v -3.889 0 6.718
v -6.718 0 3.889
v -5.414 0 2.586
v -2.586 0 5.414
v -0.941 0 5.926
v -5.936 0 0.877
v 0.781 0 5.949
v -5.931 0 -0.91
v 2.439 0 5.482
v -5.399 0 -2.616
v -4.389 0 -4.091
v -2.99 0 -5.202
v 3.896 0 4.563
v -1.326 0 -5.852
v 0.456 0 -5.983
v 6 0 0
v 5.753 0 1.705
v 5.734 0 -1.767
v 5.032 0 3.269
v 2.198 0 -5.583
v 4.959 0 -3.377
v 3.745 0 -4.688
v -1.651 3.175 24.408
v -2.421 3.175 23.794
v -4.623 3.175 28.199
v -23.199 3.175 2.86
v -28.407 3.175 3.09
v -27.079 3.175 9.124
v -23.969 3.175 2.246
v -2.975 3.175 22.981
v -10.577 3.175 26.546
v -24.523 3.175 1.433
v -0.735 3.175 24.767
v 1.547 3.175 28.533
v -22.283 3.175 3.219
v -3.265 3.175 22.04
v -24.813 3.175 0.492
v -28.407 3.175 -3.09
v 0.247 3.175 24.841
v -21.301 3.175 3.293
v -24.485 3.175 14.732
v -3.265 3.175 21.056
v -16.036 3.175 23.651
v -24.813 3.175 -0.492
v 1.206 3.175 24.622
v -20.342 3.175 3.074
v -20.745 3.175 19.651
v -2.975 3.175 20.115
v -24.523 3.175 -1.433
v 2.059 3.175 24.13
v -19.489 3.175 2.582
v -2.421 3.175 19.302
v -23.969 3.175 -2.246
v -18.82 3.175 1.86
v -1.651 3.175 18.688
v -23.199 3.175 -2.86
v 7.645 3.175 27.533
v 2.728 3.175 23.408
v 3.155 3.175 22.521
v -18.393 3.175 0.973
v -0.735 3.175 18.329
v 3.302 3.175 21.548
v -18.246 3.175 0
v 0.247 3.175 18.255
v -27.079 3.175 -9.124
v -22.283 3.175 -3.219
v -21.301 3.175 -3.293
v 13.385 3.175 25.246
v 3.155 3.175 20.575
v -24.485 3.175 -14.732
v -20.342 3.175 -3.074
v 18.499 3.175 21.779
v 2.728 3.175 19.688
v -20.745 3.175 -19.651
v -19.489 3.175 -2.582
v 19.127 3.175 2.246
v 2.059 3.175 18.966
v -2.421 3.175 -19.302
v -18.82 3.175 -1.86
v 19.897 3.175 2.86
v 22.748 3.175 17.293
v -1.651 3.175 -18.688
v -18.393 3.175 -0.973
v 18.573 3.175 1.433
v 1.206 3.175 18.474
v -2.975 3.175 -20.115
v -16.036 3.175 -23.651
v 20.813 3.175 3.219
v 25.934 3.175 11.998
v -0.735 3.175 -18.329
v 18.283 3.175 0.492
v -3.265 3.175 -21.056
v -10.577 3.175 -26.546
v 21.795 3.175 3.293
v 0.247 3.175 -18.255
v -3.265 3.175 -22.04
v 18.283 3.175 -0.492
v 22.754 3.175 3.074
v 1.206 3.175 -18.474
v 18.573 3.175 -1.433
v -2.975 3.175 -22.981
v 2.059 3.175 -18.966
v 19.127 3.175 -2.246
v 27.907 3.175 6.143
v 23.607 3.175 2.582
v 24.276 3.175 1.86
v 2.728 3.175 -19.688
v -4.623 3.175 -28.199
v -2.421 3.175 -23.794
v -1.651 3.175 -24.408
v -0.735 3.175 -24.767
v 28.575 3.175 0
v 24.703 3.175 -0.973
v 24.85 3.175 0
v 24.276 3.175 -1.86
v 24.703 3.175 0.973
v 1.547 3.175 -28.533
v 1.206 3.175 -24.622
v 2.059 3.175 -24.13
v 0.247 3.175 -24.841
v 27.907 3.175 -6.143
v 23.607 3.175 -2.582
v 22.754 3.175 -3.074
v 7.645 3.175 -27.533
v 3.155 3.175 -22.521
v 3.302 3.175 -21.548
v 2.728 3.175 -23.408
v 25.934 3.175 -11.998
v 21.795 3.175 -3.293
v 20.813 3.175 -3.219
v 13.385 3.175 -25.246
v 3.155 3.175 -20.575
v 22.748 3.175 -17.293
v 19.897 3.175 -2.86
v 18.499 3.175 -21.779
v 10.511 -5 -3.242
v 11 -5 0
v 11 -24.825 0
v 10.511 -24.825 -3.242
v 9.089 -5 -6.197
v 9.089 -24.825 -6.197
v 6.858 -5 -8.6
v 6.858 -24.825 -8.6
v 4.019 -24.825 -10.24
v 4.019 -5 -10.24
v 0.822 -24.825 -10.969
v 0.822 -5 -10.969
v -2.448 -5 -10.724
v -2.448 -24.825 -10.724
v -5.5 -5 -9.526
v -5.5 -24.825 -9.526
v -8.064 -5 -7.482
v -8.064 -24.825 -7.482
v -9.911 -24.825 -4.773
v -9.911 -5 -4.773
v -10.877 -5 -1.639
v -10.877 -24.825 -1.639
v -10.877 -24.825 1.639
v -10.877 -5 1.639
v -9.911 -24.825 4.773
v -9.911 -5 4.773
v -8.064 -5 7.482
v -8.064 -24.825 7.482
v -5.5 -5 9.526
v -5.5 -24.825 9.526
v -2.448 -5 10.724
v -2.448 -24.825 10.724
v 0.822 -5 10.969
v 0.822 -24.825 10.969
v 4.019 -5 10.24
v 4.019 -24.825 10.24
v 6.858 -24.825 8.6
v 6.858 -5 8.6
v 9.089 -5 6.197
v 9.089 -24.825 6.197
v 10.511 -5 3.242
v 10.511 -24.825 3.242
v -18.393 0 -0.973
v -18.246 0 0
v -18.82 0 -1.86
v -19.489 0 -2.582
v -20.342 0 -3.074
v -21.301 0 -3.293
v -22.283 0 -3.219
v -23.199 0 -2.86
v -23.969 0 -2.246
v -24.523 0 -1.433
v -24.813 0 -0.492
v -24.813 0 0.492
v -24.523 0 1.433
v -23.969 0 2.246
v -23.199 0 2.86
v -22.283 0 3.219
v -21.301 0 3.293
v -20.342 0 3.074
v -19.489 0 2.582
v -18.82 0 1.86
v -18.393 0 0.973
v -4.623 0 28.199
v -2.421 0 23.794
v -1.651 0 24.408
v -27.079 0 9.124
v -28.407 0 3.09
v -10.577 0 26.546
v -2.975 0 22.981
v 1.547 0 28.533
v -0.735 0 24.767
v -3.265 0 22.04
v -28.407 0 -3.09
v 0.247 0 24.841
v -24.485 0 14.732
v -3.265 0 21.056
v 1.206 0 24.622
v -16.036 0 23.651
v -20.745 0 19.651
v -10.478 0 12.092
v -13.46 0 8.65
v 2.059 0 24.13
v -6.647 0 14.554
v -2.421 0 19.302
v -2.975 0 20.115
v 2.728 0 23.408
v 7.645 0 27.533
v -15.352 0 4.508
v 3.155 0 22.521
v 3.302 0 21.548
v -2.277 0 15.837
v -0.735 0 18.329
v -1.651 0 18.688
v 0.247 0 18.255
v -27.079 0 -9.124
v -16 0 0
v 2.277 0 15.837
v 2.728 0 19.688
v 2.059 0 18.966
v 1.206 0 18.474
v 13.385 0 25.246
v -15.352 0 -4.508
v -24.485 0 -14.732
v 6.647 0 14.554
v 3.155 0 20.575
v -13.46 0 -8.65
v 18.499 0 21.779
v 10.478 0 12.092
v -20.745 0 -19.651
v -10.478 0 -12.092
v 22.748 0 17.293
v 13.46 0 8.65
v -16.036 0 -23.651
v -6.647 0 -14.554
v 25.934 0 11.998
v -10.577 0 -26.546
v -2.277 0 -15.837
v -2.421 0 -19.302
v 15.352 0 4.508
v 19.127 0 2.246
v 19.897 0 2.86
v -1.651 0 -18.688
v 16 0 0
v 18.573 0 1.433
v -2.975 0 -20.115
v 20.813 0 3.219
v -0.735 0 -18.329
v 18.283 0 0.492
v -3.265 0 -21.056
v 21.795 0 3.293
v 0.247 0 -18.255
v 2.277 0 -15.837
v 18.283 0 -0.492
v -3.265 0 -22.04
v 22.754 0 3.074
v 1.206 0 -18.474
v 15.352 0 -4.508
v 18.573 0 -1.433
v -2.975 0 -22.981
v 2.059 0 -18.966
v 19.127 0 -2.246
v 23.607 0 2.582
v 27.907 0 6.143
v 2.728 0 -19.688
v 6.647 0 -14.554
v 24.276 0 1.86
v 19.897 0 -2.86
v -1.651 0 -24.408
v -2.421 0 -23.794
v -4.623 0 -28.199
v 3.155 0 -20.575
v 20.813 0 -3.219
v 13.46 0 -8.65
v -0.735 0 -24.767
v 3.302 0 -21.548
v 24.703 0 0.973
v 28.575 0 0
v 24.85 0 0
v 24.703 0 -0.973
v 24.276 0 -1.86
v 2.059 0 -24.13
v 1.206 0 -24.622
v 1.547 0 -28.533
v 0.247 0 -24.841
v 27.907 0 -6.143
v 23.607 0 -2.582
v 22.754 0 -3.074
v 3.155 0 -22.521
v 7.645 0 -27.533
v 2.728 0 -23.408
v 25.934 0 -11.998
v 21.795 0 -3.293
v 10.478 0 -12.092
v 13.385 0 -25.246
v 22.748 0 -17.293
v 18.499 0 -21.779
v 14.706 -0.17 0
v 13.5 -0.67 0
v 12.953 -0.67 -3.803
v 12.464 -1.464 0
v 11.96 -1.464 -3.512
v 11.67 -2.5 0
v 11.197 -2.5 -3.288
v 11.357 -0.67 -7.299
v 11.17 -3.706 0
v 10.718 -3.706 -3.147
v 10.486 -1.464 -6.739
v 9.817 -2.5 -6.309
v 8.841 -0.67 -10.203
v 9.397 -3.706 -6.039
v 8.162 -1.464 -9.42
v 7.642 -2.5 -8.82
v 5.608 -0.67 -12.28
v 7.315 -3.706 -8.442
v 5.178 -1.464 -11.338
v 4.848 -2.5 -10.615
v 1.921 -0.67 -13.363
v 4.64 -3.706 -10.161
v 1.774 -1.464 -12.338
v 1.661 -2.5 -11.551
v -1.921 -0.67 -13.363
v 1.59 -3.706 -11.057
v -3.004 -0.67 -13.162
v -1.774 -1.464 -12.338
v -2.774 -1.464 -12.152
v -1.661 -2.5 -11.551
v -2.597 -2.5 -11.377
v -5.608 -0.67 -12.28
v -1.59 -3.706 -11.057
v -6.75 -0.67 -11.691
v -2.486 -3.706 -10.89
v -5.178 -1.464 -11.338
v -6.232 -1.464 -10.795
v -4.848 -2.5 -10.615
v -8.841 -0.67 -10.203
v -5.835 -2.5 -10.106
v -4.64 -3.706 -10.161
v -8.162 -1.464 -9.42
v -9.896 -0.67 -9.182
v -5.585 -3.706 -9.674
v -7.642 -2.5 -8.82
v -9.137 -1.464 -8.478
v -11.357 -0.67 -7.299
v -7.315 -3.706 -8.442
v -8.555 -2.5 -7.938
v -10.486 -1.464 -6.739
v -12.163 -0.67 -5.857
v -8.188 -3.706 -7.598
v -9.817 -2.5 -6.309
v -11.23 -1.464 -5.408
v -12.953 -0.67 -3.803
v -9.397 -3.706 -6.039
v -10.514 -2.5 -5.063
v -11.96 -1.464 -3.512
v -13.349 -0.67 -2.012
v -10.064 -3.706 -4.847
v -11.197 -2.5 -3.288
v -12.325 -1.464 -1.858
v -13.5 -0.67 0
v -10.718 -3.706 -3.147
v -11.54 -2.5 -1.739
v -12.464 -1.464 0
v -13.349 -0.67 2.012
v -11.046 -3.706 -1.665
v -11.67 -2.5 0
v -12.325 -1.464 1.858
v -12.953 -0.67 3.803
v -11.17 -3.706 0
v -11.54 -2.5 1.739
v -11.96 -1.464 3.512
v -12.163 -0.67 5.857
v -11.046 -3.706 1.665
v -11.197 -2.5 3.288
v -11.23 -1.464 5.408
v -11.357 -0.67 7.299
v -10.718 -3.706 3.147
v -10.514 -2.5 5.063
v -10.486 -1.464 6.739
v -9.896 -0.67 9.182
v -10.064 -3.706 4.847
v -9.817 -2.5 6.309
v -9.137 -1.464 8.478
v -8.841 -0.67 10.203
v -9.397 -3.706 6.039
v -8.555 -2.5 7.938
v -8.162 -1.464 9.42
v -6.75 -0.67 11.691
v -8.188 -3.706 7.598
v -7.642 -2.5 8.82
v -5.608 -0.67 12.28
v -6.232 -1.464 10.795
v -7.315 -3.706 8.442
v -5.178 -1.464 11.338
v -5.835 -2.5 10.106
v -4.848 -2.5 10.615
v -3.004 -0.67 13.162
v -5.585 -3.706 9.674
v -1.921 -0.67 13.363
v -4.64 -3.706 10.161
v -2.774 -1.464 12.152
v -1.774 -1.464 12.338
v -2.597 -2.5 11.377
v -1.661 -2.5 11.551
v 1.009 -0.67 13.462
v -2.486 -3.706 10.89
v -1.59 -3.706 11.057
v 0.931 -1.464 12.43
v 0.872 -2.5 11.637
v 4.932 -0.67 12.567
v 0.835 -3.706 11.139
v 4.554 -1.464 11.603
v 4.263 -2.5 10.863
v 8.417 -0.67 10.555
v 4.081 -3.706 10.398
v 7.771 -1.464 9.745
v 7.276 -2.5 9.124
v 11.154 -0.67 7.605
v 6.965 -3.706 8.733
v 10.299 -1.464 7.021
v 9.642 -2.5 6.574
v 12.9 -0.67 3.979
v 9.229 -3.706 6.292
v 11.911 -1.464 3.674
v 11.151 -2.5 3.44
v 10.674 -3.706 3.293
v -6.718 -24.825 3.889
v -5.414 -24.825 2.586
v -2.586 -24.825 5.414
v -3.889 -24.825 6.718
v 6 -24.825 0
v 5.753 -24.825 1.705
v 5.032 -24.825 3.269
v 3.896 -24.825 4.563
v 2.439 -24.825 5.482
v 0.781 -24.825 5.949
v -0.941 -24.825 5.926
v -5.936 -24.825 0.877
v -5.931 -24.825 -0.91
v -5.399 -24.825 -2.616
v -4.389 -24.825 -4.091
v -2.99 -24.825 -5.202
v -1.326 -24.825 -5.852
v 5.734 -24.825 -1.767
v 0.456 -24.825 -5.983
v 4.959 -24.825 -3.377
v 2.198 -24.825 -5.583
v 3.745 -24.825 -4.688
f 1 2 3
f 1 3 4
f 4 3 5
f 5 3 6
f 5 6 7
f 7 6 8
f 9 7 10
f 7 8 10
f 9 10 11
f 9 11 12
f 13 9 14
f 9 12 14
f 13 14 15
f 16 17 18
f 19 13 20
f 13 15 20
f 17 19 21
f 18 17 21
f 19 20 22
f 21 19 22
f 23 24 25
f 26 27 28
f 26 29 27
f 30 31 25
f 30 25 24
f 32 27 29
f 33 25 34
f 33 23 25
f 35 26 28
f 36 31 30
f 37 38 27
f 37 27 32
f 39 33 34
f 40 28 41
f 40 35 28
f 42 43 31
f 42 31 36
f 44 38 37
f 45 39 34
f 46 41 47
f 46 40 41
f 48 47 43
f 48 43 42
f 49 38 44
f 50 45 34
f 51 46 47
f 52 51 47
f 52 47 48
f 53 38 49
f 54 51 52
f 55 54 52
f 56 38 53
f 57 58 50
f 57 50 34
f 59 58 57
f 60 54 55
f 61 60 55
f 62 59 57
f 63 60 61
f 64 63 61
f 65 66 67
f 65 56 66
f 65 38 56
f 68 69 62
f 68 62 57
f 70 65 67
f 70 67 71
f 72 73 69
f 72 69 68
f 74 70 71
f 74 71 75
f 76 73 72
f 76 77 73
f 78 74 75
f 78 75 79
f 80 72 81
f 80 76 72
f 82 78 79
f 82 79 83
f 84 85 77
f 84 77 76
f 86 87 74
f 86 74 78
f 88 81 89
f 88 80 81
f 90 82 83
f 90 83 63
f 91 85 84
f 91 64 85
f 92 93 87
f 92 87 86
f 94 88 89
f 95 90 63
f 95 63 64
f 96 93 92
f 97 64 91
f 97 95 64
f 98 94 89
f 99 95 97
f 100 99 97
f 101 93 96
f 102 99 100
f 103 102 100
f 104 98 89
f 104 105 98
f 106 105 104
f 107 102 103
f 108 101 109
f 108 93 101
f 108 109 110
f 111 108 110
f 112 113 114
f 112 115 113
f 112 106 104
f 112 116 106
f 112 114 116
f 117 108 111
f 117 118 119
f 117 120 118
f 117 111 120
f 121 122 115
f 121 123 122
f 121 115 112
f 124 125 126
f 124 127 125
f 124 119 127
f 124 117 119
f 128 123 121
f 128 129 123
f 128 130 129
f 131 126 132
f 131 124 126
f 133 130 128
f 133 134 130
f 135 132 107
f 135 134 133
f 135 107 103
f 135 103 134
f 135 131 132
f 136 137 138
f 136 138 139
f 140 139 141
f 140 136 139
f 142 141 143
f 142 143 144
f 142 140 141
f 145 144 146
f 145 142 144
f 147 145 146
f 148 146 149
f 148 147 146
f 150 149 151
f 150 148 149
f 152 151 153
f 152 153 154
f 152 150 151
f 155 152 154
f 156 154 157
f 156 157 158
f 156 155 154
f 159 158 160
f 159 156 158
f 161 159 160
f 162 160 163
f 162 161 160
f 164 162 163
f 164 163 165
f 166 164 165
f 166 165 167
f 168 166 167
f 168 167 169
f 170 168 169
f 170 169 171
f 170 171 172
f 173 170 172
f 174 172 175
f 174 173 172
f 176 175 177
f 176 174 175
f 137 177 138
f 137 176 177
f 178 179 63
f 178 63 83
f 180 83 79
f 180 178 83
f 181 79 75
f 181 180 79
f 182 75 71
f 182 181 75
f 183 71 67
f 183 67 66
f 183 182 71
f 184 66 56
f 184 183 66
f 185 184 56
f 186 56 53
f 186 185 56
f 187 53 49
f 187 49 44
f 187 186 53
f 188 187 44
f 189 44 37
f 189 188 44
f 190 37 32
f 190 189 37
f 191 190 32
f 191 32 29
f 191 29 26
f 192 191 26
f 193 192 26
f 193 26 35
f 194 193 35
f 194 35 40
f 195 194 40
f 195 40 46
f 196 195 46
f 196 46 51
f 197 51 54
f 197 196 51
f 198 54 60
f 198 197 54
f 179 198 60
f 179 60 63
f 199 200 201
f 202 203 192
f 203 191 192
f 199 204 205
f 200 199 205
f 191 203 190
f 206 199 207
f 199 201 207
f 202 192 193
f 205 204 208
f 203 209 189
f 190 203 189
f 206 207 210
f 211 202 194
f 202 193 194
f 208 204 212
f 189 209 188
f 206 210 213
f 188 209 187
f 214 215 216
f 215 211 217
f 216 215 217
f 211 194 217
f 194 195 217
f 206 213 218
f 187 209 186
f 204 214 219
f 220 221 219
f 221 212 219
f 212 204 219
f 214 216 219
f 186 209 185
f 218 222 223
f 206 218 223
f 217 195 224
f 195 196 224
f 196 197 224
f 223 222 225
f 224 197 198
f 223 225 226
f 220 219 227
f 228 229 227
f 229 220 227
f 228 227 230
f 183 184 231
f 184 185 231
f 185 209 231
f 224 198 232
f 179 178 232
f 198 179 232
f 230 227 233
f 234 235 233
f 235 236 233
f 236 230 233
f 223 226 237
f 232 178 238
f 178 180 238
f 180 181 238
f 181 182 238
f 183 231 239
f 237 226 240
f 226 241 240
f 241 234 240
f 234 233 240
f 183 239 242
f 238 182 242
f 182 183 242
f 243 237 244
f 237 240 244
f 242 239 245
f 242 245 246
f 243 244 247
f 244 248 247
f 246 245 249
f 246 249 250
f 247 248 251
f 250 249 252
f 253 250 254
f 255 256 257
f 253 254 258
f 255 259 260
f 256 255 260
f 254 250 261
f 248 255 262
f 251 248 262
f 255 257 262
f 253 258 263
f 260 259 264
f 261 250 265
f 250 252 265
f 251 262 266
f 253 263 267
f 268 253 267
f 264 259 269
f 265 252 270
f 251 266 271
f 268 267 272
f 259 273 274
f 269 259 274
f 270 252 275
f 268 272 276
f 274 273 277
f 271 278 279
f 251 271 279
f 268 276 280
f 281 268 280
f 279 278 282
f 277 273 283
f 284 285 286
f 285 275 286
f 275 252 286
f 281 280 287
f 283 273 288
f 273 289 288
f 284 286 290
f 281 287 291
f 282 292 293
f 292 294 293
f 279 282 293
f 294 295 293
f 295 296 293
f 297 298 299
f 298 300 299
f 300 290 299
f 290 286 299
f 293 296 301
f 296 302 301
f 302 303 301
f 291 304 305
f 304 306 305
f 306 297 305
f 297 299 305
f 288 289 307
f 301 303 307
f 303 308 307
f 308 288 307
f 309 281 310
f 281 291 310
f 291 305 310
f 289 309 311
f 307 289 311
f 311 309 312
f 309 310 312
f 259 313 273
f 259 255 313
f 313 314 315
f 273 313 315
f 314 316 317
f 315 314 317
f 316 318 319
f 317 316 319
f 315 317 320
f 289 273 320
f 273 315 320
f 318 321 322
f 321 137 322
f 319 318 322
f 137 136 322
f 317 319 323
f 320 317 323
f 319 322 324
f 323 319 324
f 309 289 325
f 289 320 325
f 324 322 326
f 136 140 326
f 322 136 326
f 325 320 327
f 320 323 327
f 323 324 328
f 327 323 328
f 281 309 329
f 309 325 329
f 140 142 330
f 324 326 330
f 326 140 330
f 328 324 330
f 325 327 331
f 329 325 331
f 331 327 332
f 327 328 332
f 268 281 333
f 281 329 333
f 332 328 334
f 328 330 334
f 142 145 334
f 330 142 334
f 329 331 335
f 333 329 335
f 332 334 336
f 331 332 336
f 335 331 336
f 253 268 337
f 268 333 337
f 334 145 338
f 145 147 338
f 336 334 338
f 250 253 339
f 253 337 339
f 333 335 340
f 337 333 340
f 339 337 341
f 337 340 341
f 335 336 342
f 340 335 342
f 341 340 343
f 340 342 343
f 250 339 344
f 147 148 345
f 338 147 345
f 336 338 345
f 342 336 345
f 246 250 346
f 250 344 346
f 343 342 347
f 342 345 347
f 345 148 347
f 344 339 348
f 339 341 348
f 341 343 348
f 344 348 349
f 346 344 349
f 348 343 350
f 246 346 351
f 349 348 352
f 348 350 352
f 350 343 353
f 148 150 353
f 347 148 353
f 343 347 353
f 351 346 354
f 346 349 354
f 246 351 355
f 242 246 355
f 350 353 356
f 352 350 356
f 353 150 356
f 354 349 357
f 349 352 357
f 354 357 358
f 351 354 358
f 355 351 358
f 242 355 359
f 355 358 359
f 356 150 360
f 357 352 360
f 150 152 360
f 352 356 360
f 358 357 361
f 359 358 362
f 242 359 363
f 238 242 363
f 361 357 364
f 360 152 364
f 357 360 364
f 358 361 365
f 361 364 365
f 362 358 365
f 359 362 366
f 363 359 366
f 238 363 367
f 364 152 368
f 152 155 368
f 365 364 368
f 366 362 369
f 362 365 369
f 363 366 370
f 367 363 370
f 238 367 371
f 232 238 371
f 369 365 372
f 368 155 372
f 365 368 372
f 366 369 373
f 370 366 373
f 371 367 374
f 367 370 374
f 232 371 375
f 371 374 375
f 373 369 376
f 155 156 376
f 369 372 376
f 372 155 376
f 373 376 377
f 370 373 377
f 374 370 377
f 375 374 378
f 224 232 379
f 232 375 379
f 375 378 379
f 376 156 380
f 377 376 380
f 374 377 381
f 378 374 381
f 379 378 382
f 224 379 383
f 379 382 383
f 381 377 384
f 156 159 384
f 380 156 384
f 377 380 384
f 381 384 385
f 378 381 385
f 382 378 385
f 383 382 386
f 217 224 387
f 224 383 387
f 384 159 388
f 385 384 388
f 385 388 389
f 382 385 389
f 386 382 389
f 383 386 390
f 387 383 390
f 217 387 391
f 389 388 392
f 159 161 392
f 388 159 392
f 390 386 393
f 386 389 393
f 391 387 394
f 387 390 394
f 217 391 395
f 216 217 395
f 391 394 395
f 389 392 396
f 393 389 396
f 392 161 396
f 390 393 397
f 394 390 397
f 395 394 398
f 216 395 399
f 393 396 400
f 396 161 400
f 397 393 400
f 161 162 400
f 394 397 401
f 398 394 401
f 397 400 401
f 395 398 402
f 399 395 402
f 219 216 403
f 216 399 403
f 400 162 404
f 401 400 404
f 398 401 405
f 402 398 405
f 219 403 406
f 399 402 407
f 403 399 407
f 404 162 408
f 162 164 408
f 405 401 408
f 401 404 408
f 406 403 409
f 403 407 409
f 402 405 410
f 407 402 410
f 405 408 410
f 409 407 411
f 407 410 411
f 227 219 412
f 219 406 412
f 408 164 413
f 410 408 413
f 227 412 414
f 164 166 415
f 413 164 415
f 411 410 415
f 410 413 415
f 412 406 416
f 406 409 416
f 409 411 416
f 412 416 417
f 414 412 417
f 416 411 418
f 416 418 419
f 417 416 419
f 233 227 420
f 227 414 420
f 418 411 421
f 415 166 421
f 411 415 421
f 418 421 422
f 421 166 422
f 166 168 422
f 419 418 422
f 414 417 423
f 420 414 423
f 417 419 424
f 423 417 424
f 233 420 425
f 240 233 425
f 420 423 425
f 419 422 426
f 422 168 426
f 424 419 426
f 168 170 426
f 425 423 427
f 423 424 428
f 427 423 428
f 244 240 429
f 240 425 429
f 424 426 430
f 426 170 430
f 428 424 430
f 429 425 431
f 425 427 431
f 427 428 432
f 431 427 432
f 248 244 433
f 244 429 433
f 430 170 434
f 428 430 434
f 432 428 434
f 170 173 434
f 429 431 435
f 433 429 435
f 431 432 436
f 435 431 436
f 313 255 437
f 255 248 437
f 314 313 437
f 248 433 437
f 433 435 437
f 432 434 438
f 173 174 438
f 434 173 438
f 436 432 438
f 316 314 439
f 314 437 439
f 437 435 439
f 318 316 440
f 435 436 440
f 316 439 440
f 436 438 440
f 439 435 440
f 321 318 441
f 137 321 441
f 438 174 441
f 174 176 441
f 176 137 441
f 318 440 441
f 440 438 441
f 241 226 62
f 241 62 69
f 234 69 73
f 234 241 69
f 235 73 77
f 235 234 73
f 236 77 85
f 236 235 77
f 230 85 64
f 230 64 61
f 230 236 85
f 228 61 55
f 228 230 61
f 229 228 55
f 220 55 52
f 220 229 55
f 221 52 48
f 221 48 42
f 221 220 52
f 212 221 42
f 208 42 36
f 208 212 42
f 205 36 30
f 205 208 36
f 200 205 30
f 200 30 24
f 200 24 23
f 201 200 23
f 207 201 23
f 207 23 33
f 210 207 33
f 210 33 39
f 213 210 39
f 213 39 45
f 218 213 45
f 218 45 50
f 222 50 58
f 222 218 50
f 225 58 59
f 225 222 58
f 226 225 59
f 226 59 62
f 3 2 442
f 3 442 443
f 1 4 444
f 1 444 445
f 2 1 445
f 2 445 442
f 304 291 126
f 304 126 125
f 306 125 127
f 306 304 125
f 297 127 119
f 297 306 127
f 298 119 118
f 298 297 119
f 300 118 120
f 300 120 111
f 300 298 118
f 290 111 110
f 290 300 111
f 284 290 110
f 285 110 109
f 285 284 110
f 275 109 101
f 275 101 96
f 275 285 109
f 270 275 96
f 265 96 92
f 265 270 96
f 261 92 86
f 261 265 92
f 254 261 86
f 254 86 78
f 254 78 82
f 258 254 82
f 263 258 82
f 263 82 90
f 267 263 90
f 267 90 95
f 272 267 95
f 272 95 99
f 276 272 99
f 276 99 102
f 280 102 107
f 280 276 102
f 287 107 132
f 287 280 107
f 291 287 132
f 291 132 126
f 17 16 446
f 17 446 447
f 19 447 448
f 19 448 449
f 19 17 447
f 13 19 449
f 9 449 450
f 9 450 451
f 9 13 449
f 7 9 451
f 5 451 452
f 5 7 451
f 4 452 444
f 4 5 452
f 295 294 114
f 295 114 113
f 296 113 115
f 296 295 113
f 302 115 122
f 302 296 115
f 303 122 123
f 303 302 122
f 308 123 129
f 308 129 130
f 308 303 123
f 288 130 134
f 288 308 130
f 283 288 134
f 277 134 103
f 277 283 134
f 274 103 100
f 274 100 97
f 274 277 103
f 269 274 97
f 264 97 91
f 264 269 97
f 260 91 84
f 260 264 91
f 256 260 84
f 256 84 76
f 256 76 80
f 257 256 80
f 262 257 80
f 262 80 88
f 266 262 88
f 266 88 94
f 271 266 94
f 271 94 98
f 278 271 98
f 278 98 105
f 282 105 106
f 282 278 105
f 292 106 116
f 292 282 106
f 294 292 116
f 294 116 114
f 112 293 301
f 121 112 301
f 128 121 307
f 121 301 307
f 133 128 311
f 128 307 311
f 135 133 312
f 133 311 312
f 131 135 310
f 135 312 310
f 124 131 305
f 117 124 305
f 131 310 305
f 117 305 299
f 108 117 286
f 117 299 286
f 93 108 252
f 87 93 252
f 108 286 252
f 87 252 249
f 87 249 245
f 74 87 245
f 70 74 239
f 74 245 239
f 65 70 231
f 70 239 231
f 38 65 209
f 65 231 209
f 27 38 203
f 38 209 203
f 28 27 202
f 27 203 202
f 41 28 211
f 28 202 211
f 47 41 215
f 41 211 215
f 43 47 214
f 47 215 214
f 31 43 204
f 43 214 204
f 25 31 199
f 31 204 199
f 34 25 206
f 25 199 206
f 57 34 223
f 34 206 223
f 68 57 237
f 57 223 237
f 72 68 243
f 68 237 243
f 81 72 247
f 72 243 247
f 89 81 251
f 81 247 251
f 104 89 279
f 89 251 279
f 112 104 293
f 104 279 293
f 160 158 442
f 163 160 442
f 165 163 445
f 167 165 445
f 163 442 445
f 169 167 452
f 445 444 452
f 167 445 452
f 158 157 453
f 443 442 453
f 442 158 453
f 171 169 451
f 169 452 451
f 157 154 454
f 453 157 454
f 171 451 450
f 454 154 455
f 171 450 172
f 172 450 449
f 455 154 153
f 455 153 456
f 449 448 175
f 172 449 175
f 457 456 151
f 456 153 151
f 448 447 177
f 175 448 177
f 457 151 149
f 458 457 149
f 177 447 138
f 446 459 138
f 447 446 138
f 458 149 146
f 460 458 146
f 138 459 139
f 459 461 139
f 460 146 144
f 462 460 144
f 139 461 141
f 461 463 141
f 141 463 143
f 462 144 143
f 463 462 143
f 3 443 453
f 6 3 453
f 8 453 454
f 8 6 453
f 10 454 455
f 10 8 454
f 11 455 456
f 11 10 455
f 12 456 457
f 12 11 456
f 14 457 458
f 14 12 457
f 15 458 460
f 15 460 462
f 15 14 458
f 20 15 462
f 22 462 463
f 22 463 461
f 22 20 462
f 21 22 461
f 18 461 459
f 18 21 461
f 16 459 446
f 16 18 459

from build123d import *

# Parameters (mm, degrees)
SKETCH1_R           = 28.575
SKETCH1_R_2         = 3.302
SKETCH1_R_3         = 11
BOSS_EXTRUDE1_DEPTH = 3.175
SKETCH1_4_R         = 11
BOSS_EXTRUDE2_DEPTH = 3.175
SKETCH1_5_R         = 11
BOSS_EXTRUDE3_DEPTH = 24.825
FILLET1_R           = 5


with BuildPart() as part:
    # Sketch1 → Boss-Extrude1 (new body)
    with BuildSketch(Plane(origin=(0, 0, 0), x_dir=(1, 0, 0), z_dir=(0, 1, 0))):
        Circle(SKETCH1_R)
        with Locations((0, -21.548)):
            Circle(SKETCH1_R_2, mode=Mode.SUBTRACT)
        with Locations((-21.548, 0)):
            Circle(SKETCH1_R_2, mode=Mode.SUBTRACT)
        Circle(SKETCH1_R_3, mode=Mode.SUBTRACT)
        with BuildLine():
            ThreePointArc((24.85, 0), (21.548, -3.302), (18.246, 0))
            ThreePointArc((18.246, 0), (21.548, 3.302), (24.85, 0))
        make_face(mode=Mode.SUBTRACT)
        with Locations((0, 21.548)):
            Circle(SKETCH1_R_2, mode=Mode.SUBTRACT)
    extrude(amount=BOSS_EXTRUDE1_DEPTH)

    # Sketch1<4> → Boss-Extrude2 (add)
    with BuildSketch(Plane(origin=(0, 0, 0), x_dir=(1, 0, 0), z_dir=(0, 1, 0))):
        Circle(SKETCH1_4_R)
    extrude(amount=BOSS_EXTRUDE2_DEPTH)

    # Sketch1<5> → Boss-Extrude3 (add)
    with BuildSketch(Plane(origin=(0, 0, 0), x_dir=(1, 0, 0), z_dir=(0, 1, 0))):
        Circle(SKETCH1_5_R)
        with BuildLine():
            ThreePointArc((-5.414213562, -2.585786438), (-1.325654296, 5.851721173), (6, 0))
            ThreePointArc((6, 0), (3.200412581, -5.075170865), (-2.585786438, -5.414213562))
            Line((-2.585786438, -5.414213562), (-3.889087297, -6.717514421))
            Line((-3.889087297, -6.717514421), (-6.717514421, -3.889087297))
            Line((-6.717514421, -3.889087297), (-5.414213562, -2.585786438))
        make_face(mode=Mode.SUBTRACT)
    extrude(amount=-BOSS_EXTRUDE3_DEPTH)

    # Fillet1
    fillet1_edges = [part.edges().sort_by_distance(p)[0] for p in [
        (-11, 0, 0),
    ]]
    fillet(fillet1_edges, radius=FILLET1_R)


solid = part.part
